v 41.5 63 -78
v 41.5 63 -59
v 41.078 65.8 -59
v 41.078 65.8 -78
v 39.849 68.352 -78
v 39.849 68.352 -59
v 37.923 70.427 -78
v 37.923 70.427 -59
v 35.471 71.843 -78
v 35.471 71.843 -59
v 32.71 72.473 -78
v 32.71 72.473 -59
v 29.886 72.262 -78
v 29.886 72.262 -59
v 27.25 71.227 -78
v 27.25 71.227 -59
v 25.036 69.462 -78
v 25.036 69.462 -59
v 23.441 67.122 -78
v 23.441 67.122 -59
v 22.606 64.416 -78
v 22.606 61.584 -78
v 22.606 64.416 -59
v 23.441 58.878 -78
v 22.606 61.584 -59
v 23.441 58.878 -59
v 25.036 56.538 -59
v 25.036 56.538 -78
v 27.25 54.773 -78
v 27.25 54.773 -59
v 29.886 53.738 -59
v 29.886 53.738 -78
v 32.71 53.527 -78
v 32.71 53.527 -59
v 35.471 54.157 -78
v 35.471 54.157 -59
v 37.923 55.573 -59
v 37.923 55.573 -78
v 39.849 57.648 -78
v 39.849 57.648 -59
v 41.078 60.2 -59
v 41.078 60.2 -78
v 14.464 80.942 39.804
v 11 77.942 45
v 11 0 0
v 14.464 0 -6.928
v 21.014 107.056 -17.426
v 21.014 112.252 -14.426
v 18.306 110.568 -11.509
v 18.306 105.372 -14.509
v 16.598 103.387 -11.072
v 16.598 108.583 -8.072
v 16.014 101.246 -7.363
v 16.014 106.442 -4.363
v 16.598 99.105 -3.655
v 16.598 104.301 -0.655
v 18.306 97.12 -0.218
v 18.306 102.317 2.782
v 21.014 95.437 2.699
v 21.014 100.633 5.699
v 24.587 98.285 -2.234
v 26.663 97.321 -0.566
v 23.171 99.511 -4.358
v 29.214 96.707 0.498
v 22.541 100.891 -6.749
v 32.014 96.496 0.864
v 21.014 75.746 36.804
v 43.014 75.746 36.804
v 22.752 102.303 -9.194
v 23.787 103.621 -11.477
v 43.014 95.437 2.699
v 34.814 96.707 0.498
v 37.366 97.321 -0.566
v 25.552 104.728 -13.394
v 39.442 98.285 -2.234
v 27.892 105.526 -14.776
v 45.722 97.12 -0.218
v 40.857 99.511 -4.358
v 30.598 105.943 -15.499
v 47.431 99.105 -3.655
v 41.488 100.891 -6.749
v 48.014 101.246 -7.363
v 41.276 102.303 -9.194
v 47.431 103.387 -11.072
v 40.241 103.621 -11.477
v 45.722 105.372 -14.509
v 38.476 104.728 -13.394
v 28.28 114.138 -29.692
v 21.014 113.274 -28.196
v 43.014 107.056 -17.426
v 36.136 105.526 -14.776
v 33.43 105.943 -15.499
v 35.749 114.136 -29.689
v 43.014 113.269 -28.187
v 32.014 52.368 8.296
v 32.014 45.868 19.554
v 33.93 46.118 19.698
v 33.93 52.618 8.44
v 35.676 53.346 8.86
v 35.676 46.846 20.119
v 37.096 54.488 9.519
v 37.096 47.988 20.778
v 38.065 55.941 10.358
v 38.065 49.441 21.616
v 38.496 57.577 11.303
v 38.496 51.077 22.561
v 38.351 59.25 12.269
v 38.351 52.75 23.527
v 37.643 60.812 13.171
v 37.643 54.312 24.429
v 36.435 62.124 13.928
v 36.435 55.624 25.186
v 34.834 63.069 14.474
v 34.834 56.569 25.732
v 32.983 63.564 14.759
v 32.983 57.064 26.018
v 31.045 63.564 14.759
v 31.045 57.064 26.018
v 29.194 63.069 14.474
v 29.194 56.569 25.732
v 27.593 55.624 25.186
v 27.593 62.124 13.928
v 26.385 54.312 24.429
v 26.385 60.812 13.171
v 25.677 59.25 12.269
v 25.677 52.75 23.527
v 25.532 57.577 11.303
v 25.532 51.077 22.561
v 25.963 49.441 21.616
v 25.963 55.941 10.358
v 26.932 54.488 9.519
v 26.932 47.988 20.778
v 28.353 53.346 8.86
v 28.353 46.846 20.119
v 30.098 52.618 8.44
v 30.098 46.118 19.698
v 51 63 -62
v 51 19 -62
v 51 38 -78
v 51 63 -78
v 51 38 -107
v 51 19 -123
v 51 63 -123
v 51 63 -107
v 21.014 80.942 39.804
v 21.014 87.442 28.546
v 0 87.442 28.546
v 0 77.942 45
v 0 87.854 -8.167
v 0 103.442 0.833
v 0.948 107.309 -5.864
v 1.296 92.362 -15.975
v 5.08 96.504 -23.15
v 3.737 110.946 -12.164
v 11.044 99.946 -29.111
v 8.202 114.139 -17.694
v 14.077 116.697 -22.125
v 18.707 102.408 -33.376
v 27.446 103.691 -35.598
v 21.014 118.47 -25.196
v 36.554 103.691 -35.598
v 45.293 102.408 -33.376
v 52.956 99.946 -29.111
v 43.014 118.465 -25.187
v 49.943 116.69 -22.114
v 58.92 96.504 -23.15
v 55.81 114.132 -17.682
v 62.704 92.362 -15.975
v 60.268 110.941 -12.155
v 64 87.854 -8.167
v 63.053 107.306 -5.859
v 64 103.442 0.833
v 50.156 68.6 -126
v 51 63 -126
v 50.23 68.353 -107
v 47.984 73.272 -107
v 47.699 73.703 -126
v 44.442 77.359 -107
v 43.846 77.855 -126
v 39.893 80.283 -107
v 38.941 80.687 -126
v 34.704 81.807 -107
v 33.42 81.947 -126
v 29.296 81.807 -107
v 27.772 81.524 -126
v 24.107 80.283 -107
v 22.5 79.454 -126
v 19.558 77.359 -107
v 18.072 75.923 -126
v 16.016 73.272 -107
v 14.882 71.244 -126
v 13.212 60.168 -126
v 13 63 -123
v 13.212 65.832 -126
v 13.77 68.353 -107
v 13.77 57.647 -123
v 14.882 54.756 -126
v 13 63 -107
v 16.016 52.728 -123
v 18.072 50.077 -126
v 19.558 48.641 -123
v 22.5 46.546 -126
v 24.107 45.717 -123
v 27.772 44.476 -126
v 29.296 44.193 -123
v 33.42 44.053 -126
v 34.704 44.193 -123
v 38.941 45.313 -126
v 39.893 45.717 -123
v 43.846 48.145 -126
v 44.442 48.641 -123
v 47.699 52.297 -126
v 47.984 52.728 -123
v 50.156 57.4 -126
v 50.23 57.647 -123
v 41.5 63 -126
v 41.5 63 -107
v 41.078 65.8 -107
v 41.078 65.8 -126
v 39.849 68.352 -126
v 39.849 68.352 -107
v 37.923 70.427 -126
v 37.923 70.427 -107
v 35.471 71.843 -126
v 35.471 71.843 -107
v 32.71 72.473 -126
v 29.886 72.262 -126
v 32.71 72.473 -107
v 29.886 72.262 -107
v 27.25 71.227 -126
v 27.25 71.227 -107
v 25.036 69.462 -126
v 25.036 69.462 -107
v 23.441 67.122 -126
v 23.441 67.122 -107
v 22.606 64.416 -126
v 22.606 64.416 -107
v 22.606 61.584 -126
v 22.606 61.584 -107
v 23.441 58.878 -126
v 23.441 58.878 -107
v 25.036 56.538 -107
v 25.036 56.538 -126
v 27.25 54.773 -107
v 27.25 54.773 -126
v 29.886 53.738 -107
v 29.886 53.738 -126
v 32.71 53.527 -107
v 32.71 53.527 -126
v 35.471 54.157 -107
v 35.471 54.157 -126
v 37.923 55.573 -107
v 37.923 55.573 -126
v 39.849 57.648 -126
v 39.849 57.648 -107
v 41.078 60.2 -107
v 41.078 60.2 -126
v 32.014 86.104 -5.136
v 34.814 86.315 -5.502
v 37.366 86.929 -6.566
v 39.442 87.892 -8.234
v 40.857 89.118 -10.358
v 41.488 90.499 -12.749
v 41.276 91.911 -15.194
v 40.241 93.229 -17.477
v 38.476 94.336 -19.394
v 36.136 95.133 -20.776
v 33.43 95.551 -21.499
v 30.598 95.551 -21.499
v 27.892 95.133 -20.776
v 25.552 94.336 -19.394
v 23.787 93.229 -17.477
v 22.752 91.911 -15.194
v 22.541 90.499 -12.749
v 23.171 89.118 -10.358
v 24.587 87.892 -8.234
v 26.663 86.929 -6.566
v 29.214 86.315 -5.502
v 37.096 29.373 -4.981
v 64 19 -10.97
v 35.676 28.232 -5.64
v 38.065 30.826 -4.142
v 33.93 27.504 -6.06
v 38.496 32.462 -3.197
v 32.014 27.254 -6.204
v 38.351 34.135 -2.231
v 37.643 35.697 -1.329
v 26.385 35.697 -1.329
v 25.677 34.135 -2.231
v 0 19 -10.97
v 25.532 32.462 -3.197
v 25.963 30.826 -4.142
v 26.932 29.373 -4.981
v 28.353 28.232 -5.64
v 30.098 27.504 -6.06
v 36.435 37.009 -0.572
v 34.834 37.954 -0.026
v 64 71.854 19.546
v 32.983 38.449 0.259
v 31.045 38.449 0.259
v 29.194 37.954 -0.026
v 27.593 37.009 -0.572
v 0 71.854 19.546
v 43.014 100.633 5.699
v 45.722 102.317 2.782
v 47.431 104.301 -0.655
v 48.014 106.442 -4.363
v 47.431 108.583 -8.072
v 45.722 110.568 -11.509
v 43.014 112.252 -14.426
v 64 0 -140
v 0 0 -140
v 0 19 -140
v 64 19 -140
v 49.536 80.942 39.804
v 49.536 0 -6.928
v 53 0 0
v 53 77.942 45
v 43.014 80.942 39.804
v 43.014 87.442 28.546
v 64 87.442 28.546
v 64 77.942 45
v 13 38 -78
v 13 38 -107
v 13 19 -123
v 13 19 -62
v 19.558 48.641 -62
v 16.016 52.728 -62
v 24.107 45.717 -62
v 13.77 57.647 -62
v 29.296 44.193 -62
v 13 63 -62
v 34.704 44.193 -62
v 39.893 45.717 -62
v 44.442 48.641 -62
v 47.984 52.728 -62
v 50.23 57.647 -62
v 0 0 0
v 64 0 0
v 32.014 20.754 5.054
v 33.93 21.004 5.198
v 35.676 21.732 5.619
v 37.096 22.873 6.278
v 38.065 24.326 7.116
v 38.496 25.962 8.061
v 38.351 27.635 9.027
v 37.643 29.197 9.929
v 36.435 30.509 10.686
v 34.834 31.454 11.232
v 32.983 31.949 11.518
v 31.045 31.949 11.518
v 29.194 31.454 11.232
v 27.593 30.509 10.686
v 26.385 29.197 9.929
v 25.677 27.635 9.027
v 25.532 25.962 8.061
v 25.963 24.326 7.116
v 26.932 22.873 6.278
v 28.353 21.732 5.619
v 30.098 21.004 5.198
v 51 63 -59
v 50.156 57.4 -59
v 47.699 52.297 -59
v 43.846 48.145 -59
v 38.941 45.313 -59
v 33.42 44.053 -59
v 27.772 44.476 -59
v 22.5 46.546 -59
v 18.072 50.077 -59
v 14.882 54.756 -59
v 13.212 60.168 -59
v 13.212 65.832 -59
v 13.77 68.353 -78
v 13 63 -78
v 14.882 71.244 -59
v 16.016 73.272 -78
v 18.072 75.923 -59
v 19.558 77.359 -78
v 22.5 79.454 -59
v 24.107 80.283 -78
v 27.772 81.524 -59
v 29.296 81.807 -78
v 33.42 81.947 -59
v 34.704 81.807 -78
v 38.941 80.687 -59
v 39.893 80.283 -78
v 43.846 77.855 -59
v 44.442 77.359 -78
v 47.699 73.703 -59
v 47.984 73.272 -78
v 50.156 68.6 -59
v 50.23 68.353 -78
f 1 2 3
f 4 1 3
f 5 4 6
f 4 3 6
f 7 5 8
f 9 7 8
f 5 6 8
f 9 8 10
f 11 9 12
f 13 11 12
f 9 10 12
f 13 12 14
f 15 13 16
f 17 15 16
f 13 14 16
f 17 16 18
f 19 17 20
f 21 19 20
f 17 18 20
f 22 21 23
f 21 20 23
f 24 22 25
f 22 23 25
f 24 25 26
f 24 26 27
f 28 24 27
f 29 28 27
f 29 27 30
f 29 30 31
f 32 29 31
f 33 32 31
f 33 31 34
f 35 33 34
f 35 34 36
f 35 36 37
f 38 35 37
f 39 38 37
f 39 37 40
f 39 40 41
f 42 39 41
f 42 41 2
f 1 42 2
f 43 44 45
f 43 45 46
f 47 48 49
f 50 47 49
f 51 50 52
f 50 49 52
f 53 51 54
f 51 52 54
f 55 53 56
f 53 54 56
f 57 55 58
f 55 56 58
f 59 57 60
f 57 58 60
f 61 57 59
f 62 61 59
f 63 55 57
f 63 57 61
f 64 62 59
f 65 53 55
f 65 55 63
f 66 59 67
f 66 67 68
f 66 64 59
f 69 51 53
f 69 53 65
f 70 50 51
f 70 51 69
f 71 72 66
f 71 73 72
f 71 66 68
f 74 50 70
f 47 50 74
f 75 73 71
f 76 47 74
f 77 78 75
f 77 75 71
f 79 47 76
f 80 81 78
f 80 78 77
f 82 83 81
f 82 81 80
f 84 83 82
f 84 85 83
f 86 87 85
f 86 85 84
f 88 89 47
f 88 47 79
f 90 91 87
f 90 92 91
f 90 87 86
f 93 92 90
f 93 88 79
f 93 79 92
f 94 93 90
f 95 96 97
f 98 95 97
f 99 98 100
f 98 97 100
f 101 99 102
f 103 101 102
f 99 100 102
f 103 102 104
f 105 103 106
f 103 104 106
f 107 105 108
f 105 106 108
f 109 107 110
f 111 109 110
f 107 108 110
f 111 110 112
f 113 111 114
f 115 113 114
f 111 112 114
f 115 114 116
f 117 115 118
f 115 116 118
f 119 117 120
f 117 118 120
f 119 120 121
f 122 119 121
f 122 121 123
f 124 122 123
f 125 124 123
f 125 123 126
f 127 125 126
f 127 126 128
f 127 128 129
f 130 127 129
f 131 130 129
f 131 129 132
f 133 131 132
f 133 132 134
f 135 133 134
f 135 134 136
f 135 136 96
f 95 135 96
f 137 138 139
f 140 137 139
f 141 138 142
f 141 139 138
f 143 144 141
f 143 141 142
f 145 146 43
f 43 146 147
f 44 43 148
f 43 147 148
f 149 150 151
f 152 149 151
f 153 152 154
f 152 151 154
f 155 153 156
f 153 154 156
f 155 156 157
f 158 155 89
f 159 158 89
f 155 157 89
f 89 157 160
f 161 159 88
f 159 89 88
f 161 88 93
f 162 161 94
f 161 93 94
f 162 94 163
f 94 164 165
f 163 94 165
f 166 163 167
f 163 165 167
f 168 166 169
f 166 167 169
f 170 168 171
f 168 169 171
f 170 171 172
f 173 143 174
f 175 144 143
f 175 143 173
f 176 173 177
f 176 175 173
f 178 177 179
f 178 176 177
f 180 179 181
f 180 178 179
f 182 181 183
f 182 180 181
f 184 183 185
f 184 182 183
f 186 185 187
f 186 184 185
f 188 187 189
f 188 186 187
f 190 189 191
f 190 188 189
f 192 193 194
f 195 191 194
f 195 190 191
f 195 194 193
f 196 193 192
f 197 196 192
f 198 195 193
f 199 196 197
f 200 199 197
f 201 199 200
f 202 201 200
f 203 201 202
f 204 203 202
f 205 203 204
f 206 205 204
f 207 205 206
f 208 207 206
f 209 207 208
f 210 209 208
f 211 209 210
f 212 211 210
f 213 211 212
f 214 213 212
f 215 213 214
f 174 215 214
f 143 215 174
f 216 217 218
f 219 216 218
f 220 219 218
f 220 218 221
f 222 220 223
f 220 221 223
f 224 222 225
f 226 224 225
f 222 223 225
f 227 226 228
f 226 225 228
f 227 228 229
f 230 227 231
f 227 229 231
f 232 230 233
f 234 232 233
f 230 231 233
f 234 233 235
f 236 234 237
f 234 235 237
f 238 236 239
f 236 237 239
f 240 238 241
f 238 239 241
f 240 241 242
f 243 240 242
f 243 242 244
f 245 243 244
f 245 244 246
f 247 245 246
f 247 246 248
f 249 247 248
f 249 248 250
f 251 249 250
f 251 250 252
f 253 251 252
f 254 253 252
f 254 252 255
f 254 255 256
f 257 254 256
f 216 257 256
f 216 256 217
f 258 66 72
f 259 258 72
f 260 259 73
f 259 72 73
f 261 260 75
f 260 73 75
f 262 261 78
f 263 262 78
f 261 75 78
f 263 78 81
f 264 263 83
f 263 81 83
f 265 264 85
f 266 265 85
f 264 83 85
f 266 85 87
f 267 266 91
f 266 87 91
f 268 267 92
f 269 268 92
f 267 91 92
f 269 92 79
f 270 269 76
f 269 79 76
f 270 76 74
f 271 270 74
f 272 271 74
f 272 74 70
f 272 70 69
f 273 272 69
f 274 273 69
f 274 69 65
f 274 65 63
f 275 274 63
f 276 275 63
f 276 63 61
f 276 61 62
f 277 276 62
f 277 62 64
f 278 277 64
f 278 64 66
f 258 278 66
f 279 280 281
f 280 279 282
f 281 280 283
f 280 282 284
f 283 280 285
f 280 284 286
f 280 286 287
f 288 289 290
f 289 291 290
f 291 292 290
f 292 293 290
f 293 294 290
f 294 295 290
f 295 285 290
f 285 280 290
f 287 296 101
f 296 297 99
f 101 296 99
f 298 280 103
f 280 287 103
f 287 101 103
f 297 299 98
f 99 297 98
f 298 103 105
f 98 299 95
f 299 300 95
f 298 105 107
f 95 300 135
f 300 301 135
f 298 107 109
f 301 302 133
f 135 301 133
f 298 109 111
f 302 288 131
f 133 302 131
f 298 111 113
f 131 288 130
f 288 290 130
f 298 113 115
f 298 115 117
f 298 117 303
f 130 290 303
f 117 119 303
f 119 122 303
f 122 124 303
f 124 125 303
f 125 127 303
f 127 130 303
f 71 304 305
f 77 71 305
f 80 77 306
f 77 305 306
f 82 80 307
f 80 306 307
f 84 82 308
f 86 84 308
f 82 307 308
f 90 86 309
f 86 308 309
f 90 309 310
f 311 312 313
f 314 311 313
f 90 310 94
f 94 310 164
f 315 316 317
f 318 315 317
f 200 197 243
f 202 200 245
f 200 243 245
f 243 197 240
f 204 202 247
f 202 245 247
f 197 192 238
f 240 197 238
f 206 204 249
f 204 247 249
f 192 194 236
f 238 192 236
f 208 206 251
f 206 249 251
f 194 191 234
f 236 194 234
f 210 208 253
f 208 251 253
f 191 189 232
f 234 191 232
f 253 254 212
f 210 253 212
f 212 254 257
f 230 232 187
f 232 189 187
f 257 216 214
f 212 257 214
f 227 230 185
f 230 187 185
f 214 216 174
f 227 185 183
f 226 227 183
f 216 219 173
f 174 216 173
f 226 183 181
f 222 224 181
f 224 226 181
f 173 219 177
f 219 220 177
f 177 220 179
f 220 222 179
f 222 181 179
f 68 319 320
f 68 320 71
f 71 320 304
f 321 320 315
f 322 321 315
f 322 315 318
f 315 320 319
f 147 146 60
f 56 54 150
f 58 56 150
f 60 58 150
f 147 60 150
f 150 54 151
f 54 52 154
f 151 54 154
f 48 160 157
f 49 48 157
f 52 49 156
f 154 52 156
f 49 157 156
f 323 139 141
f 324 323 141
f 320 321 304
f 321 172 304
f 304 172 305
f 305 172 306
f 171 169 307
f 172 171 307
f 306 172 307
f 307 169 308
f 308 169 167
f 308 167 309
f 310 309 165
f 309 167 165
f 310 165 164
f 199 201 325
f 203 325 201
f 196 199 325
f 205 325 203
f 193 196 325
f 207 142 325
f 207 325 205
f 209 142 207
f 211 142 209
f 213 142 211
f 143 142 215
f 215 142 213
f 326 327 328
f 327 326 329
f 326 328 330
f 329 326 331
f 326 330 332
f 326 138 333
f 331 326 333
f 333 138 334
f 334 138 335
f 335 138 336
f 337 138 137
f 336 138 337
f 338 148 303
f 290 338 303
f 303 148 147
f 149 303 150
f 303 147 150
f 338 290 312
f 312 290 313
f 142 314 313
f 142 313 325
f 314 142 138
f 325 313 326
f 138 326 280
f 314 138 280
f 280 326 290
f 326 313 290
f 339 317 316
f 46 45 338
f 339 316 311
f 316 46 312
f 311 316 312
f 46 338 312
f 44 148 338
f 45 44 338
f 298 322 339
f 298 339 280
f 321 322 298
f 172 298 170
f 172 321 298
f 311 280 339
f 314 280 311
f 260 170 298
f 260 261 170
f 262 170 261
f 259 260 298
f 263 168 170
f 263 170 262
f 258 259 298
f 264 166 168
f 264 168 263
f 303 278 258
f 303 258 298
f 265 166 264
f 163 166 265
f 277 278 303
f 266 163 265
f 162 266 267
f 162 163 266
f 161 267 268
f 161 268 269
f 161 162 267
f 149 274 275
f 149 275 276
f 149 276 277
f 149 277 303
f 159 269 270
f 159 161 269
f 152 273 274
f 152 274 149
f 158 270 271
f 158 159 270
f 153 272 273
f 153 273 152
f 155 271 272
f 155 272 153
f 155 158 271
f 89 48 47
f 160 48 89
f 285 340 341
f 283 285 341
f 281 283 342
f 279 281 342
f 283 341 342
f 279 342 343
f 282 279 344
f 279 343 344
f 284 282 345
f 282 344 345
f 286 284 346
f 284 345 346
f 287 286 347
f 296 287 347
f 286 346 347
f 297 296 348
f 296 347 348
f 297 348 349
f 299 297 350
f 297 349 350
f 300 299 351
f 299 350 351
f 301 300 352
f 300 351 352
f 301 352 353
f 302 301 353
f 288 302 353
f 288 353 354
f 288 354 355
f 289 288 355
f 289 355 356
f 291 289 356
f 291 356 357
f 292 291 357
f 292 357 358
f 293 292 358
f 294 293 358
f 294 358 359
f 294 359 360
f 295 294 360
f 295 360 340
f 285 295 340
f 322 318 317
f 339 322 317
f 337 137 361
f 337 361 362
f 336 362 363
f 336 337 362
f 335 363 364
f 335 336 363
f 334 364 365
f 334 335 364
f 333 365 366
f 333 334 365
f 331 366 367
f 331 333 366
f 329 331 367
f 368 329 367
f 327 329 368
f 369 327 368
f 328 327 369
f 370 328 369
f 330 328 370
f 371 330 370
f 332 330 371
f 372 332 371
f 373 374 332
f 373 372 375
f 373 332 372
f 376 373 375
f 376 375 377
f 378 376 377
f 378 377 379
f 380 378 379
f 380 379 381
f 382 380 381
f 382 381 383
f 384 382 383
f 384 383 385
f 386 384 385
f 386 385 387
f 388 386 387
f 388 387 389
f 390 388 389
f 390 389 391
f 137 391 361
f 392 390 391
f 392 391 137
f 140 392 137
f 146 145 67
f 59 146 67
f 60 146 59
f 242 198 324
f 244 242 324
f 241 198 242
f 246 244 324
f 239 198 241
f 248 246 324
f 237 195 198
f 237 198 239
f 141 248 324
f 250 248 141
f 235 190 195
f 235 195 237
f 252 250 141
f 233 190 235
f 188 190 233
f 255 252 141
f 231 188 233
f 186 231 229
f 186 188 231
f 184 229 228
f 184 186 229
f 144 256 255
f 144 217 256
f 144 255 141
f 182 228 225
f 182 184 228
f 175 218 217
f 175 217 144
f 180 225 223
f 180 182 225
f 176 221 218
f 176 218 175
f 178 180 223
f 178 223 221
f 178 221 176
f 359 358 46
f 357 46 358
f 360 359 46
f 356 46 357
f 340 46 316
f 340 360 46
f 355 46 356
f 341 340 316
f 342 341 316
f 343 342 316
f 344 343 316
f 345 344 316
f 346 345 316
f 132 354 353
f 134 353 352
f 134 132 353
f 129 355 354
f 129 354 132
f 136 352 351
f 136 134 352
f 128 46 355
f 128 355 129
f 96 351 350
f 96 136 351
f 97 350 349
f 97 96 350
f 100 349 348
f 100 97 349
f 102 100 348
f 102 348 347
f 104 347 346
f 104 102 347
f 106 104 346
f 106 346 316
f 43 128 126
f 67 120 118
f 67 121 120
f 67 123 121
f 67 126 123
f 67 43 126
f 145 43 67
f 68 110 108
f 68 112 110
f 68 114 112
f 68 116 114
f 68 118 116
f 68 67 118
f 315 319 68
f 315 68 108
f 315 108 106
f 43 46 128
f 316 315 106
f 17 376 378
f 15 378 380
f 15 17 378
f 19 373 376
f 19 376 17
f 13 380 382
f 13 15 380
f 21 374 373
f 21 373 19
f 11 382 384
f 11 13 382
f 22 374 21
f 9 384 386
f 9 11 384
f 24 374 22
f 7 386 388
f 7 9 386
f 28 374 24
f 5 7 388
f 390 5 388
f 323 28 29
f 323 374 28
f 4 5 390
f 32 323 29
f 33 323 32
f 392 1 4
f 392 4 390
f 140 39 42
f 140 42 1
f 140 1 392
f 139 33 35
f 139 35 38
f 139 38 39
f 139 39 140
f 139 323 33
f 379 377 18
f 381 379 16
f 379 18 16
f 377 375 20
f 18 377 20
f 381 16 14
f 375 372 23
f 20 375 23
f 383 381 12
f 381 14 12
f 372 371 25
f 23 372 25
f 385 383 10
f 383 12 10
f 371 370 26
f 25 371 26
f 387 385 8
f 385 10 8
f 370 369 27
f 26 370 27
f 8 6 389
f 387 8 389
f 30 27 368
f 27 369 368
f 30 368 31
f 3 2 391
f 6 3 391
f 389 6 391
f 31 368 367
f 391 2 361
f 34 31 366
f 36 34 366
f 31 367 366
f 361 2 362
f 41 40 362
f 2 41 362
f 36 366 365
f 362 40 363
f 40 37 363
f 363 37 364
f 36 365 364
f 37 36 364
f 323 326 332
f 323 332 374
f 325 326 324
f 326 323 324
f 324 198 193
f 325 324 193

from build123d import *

# Parameters (mm, degrees)
EXTRUDE_THIN1_DEPTH     = 64
BOSS_EXTRUDE1_DEPTH     = 18
SKETCH3_W               = 61
SKETCH3_H               = 44
BOSS_EXTRUDE2_DEPTH     = 19
SKETCH4_W               = 29
SKETCH4_H               = 25
CUT_EXTRUDE1_DEPTH      = 191.964551072
CUT_EXTRUDE2_DEPTH      = 55
CUT_EXTRUDE2_DEPTH_BACK = 204.633149969
SKETCH5_R               = 19
SKETCH6_R               = 19
BOSS_EXTRUDE3_DEPTH     = 19
SKETCH8_R               = 19
BOSS_EXTRUDE4_DEPTH     = 19
SKETCH9_R               = 9.5
CUT_EXTRUDE3_DEPTH      = 171.817035937
CUT_EXTRUDE8_DEPTH      = 211.703583263
SKETCH16_W              = 22
SKETCH16_H              = 80
CUT_EXTRUDE9_DEPTH      = 6
SKETCH17_R              = 16
CUT_EXTRUDE10_DEPTH     = 6
SKETCH18_R              = 9.5
CUT_EXTRUDE11_DEPTH     = 19
SKETCH19_R              = 6.5
CUT_EXTRUDE12_DEPTH     = 19


with BuildPart() as part:
    # Sketch1 → Extrude-Thin1 (new body)
    with BuildSketch(Plane(origin=(0, 0, 0), x_dir=(0, 0, -1), z_dir=(1, 0, 0))):
        Polygon((-45, 77.942286341), (0, 0), (140, 0), (140, 19), (10.969655115, 19), (-28.545517328, 87.442286341), align=None)
    extrude(amount=EXTRUDE_THIN1_DEPTH)

    # Sketch2 → Boss-Extrude1 (add)
    with BuildSketch(Plane(origin=(0, 77.942286341, 45), x_dir=(1, 0, 0), z_dir=(0, 0.8660254037844362, 0.5000000000000046))):
        with BuildLine():
            Line((0, 0), (0, 51))
            ThreePointArc((0, 51), (32, 83), (64, 51))
            Line((64, 51), (64, 0))
            Line((64, 0), (0, 0))
        make_face()
    extrude(amount=-BOSS_EXTRUDE1_DEPTH)

    # Sketch3 → Boss-Extrude2 (add, symmetric)
    with BuildSketch(Plane(origin=(32, 0, 0), x_dir=(0, 0, -1), z_dir=(1, 0, 0))):
        with Locations((92.5, 41)):
            Rectangle(SKETCH3_W, SKETCH3_H)
    extrude(amount=BOSS_EXTRUDE2_DEPTH, both=True)

    # Sketch4 → Cut-Extrude1 (cut, through all)
    with BuildSketch(Plane(origin=(51, 0, 0), x_dir=(0, 0, -1), z_dir=(1, 0, 0))):
        with Locations((92.5, 50.5)):
            Rectangle(SKETCH4_W, SKETCH4_H)
    extrude(amount=-CUT_EXTRUDE1_DEPTH, mode=Mode.SUBTRACT)

    # Sketch5 → Cut-Extrude2 (cut, two sides: drawn at the far end of the back side and taken through both)
    with BuildSketch(Plane.XY.offset(-107).offset(-CUT_EXTRUDE2_DEPTH_BACK)):
        with Locations((32, 63)):
            Circle(SKETCH5_R)
    extrude(amount=CUT_EXTRUDE2_DEPTH + CUT_EXTRUDE2_DEPTH_BACK, mode=Mode.SUBTRACT)

    # Sketch6 → Boss-Extrude3 (add)
    with BuildSketch(Plane.XY.offset(-107)):
        with Locations((32, 63)):
            Circle(SKETCH6_R)
    extrude(amount=-BOSS_EXTRUDE3_DEPTH)

    # Sketch8 → Boss-Extrude4 (add)
    with BuildSketch(Plane(origin=(0, 0, -78), x_dir=(-1, 0, 0), z_dir=(0, 0, -1))):
        with Locations(Location((-32, 63, 0), (0, 0, 180))):
            Circle(SKETCH8_R)
    extrude(amount=-BOSS_EXTRUDE4_DEPTH)

    # Sketch9 → Cut-Extrude3 (cut, through all)
    with BuildSketch(Plane.XY.offset(-59)):
        with Locations((32, 63)):
            Circle(SKETCH9_R)
    extrude(amount=-CUT_EXTRUDE3_DEPTH, mode=Mode.SUBTRACT)

    # Sketch15 → Cut-Extrude8 (cut, through all)
    with BuildSketch(Plane(origin=(0, 77.942286341, 45), x_dir=(1, 0, 0), z_dir=(0, 0.8660254037844362, 0.5000000000000046))):
        Polygon((11, 0), (14.464101615, 6), (49.535898385, 6), (53, 0), align=None)
    extrude(amount=-CUT_EXTRUDE8_DEPTH, mode=Mode.SUBTRACT)

    # Sketch16 → Cut-Extrude9 (cut)
    with BuildSketch(Plane(origin=(0, 77.942286341, 45), x_dir=(1, 0, 0), z_dir=(0, 0.8660254037844362, 0.5000000000000046))):
        with Locations((32.014101615, 46)):
            Rectangle(SKETCH16_W, SKETCH16_H)
    extrude(amount=-CUT_EXTRUDE9_DEPTH, mode=Mode.SUBTRACT)

    # Sketch17 → Cut-Extrude10 (cut)
    with BuildSketch(Plane(origin=(0, 77.942286341, 45), x_dir=(1, 0, 0), z_dir=(0, 0.8660254037844362, 0.5000000000000046))):
        with Locations((32.014101615, 57)):
            Circle(SKETCH17_R)
    extrude(amount=-CUT_EXTRUDE10_DEPTH, mode=Mode.SUBTRACT)

    # Sketch18 → Cut-Extrude11 (cut)
    with BuildSketch(Plane(origin=(0, 72.746133918, 42), x_dir=(1, 0, 0), z_dir=(0, 0.866025403784436, 0.5000000000000047))):
        with Locations(Location((32.014101615, 57, 0), (0, 0, 270))):
            Circle(SKETCH18_R)
    extrude(amount=-CUT_EXTRUDE11_DEPTH, mode=Mode.SUBTRACT)

    # Sketch19 → Cut-Extrude12 (cut)
    with BuildSketch(Plane(origin=(0, 3, -5.196152423), x_dir=(1, 0, 0), z_dir=(0, -0.5000000000000044, 0.8660254037844362))):
        with Locations(Location((32.014101615, 56, 0), (0, 0, 270))):
            Circle(SKETCH19_R)
        with Locations(Location((32.014101615, 27, 0), (0, 0, 270))):
            Circle(SKETCH19_R)
    extrude(amount=-CUT_EXTRUDE12_DEPTH, mode=Mode.SUBTRACT)


solid = part.part
